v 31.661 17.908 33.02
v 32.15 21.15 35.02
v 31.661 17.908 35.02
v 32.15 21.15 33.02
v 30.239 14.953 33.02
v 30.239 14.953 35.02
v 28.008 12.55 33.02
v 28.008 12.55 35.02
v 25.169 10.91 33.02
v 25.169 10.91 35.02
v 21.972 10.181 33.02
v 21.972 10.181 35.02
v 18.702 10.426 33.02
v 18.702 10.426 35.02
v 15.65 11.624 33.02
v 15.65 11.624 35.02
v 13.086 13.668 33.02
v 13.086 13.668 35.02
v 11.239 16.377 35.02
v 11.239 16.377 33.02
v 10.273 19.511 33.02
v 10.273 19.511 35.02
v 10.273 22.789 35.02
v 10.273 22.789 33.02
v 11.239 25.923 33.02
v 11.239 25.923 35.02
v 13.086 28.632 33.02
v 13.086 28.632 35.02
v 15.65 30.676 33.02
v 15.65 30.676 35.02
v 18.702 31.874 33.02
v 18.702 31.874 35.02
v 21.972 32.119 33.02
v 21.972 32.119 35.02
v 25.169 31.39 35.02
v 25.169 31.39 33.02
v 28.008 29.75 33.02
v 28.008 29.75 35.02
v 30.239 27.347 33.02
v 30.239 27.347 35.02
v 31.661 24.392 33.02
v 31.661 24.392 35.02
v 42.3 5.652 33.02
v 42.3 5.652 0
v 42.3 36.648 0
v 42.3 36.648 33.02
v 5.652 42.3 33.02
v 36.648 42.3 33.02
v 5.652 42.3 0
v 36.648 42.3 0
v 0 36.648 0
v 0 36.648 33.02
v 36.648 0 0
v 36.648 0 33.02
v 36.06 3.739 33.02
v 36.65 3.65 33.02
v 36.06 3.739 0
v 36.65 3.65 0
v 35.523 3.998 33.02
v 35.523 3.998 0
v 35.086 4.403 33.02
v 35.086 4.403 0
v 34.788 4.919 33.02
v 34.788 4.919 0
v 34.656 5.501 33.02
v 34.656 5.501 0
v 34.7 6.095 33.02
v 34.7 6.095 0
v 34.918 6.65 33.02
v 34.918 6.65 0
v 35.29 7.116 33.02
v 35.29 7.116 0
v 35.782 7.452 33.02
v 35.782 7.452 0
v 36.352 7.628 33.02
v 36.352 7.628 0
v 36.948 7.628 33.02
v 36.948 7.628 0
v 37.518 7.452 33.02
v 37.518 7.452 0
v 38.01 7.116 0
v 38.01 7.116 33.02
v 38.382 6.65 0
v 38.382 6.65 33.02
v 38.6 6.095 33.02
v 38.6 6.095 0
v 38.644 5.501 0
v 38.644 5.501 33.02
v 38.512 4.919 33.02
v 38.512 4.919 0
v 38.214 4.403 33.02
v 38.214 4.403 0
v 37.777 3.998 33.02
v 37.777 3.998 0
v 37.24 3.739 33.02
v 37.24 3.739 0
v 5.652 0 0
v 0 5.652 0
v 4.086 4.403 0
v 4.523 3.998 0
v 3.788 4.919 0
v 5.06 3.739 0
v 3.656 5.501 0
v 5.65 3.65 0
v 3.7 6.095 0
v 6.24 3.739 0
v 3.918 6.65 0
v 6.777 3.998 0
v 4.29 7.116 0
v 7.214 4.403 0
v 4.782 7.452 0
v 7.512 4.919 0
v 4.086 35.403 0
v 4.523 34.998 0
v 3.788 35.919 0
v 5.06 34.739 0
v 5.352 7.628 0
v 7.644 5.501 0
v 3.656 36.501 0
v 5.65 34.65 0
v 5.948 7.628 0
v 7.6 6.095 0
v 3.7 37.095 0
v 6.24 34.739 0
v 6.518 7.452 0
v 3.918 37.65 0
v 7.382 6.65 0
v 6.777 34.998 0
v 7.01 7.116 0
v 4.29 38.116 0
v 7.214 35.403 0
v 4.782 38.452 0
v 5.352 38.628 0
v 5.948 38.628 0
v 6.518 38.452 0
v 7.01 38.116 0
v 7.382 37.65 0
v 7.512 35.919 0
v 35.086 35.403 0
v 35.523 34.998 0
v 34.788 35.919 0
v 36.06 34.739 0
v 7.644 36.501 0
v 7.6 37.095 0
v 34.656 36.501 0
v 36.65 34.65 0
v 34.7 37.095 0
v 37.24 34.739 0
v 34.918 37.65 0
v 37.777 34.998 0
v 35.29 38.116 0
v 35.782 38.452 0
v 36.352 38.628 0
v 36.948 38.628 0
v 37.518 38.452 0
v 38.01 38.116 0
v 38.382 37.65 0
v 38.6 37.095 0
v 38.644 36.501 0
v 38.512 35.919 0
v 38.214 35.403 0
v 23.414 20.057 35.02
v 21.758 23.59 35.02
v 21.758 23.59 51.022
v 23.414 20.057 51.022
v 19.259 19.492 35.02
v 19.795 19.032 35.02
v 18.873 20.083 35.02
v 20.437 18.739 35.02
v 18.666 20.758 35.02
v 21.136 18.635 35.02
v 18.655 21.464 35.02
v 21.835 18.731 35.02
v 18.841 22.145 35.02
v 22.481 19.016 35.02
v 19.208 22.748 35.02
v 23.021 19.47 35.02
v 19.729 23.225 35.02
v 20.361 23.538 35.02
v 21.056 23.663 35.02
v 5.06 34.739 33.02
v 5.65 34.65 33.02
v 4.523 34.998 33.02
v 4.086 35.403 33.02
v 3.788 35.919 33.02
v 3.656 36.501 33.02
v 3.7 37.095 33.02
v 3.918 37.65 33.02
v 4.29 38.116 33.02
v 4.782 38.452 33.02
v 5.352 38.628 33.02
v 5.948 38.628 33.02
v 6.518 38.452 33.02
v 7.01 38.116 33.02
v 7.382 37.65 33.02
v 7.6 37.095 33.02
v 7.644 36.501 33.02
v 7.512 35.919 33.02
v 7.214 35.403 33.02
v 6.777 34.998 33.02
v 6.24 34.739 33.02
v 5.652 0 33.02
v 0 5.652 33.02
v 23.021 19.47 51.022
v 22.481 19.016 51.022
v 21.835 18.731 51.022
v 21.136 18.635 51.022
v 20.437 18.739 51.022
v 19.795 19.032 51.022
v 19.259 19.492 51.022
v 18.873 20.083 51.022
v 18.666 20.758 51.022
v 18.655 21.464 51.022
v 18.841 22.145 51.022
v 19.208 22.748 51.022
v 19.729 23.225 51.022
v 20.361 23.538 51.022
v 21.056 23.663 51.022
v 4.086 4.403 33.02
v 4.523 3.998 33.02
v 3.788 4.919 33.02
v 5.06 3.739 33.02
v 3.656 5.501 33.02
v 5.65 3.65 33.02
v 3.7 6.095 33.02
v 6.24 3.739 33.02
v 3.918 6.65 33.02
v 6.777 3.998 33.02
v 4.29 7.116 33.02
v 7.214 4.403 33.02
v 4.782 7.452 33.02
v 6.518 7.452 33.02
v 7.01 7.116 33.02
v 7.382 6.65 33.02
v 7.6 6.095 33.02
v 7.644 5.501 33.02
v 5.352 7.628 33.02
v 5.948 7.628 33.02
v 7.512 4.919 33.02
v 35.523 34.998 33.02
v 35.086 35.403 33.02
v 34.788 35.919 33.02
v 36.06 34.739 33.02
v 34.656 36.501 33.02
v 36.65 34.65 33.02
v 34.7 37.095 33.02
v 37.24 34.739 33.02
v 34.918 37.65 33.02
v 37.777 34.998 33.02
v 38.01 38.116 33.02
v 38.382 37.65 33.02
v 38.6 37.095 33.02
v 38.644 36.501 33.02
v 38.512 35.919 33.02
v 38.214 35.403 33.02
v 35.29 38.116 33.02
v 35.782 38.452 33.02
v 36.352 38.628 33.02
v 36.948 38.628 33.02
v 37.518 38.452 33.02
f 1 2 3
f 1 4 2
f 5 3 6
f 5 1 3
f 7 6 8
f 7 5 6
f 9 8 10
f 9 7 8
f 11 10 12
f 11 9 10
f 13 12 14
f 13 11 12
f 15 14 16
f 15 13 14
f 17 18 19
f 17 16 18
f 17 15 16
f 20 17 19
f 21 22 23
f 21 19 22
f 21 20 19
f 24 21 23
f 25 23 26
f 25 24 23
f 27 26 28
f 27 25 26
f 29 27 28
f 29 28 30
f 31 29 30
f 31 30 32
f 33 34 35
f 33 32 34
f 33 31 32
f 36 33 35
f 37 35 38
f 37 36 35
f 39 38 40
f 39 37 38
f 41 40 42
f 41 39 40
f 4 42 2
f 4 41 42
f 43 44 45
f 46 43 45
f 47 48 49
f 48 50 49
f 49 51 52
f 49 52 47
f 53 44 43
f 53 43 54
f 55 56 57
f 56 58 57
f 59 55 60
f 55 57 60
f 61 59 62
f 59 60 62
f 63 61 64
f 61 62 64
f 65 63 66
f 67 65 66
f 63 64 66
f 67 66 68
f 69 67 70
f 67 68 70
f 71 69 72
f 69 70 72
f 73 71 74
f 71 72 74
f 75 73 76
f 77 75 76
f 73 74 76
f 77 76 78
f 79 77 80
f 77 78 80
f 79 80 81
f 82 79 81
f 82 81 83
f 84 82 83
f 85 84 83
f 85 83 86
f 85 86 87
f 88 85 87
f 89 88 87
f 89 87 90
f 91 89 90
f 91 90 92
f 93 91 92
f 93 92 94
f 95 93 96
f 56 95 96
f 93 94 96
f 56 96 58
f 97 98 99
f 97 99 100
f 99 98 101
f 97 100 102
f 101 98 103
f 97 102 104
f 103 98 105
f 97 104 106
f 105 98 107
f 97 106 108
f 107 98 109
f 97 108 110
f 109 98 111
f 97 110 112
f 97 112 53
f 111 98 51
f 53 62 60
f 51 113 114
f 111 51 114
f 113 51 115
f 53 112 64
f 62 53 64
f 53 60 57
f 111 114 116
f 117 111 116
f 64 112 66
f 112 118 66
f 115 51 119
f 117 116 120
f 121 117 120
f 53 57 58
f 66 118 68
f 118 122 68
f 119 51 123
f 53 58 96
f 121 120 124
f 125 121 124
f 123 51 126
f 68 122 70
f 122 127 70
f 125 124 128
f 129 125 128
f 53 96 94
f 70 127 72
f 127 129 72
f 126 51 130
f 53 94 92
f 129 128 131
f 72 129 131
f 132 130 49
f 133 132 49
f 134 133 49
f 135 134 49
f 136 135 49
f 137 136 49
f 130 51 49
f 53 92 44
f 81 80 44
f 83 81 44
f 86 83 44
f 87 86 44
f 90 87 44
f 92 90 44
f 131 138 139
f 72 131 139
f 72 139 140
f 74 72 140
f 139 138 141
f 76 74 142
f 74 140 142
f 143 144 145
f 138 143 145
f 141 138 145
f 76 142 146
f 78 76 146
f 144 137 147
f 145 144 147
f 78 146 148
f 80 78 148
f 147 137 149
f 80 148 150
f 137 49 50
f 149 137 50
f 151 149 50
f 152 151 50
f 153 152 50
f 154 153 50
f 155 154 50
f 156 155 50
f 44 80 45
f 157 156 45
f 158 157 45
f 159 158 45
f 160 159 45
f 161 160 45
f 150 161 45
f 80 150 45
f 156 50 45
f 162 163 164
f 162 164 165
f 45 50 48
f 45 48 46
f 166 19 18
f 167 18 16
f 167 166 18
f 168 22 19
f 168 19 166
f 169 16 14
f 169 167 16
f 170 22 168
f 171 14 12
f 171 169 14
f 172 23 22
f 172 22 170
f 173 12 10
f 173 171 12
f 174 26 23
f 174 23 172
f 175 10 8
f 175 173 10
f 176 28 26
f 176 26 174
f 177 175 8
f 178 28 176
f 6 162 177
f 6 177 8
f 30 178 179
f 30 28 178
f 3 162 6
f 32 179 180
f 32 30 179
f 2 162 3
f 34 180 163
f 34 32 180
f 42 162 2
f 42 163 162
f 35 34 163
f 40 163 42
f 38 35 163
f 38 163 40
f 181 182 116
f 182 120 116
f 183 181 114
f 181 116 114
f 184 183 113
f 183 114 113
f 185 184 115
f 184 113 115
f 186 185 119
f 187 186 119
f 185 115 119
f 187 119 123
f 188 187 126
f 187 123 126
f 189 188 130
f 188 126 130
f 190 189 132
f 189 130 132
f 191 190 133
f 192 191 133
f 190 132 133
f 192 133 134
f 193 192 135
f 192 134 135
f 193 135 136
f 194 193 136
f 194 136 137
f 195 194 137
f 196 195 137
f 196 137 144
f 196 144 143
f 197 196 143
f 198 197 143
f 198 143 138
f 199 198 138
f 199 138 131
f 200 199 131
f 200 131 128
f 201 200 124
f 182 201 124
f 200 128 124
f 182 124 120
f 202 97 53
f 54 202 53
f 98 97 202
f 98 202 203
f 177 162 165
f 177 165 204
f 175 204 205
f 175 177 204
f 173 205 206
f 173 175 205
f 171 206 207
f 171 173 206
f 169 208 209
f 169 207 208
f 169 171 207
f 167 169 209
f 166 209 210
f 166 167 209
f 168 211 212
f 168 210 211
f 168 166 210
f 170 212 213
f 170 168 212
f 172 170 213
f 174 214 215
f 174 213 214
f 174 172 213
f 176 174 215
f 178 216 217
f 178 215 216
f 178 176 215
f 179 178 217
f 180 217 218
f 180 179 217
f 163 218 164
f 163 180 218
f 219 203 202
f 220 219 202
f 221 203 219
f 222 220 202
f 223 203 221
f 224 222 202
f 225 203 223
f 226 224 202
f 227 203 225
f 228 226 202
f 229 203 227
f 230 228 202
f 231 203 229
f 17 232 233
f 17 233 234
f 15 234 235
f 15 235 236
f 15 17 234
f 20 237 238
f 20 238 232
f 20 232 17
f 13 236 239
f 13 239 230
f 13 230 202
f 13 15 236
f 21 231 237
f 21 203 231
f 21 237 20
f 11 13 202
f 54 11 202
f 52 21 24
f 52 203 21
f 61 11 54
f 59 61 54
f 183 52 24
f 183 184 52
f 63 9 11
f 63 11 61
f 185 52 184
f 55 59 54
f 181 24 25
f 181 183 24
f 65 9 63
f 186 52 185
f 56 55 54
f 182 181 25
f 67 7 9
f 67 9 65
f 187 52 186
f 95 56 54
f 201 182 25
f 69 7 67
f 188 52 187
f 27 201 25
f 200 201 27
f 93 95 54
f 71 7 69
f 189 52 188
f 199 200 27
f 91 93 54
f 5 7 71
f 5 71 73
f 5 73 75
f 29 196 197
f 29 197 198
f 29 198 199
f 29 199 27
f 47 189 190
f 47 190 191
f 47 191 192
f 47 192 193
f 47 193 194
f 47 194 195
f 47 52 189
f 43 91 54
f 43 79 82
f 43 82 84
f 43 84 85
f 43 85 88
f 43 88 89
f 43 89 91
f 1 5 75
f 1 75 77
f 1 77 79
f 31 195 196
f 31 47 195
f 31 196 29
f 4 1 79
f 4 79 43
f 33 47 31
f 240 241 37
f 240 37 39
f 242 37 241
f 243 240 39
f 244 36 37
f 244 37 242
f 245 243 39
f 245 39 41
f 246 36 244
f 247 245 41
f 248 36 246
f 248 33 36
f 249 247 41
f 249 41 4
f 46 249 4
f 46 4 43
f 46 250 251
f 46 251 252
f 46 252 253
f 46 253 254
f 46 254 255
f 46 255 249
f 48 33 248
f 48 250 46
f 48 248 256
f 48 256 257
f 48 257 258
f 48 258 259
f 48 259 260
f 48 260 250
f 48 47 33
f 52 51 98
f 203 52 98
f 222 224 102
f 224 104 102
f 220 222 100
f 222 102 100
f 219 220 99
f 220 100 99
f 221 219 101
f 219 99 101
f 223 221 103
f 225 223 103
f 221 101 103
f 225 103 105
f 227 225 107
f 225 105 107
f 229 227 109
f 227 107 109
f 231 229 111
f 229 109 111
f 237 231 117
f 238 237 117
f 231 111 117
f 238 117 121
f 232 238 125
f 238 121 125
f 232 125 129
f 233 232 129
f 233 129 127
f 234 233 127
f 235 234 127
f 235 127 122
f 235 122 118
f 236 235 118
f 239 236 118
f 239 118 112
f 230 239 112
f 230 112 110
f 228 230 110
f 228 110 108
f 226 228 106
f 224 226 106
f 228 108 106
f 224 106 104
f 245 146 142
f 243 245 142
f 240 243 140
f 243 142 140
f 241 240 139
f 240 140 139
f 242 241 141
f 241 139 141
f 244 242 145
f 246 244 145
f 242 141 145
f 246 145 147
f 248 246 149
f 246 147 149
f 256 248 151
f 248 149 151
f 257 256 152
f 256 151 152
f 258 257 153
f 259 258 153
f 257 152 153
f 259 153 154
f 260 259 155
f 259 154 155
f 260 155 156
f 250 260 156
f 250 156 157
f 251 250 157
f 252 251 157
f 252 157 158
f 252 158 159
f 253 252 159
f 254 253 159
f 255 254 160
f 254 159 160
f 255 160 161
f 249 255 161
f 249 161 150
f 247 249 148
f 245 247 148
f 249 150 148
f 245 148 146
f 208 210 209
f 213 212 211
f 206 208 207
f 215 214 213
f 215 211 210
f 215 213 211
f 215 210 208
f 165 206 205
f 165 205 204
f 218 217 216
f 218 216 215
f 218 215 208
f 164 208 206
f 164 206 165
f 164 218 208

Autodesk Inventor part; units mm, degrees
ref_plane "YZ Plane" through (0, 0, 0) normal (1, 0, 0) x (0, 1, 0)
ref_plane "XZ Plane" through (0, 0, 0) normal (0, 1, 0) x (-1, 0, 0)
ref_plane "XY Plane" through (0, 0, 0) normal (0, 0, 1) x (1, 0, 0)
sketch "Sketch1" plane through (0, 0, 0) normal (0, 0, 1) x (1, 0, 0)
  line L0 (5.6515, 0) -> (36.6485, 0)
  line L1 (42.3, 5.6515) -> (42.3, 36.6485)
  line L2 (36.6485, 42.3) -> (5.6515, 42.3)
  line L3 (0, 36.6485) -> (0, 5.6515)
  line L4 (0, 36.6485) -> (5.6515, 42.3)
  line L5 (36.6485, 42.3) -> (42.3, 36.6485)
  line L6 (42.3, 5.6515) -> (36.6485, 0)
  line L7 (5.6515, 0) -> (0, 5.6515)
  line L8 (21.15, 42.3) -> (21.15, 0) construction
  line L9 (0, 21.9578) -> (42.3, 21.9578) construction
  point P0 (0, 0)
  point P1 (42.3, 42.3)
  point P2 (42.3, 0)
  point P3 (0, 42.3)
  dimension "d0" = 42.3
  dimension "d1" = 42.3
  dimension "d2" = 5.6515
  dimension "d3" = 5.6515
  dimension "d4" = 5.6515
  dimension "d5" = 5.6515
  dimension "d6" = 5.6515
  dimension "d7" = 5.6515
  dimension "d8" = 5.6515
  dimension "d9" = 5.6515
  dimension "d10" = 30.997
extrude "Extrusion1" add sketch "Sketch1" along normal blind 33.02
sketch "Sketch2" plane through (0, 0, 33.02) normal (0, 0, 1) x (1, 0, 0)
  line L0 (5.6515, 42.3) -> (36.6485, 42.3) projected
  line L1 (0, 5.6515) -> (0, 36.6485) projected
  line L2 (36.6485, 0) -> (5.6515, 0) projected
  line L3 (42.3, 36.6485) -> (42.3, 5.6515) projected
  line L4 (21.15, 42.3) -> (21.15, 0) construction
  line L5 (0, 21.15) -> (42.3, 21.15) construction
  circle A0 centre (21.15, 21.15) radius 11
  point P0 (0, 0)
  dimension "d13" = 22
extrude "Extrusion2" add sketch "Sketch2" along normal blind 2
sketch "Sketch3" plane through (21.15, 21.15, 35.02) normal (0, 0, 1) x (1, 0, 0)
  circle A0 centre (0, 0) radius 11 projected
  arc A1 (0.6085, 2.4399) -> (2.2645, -1.0932) centre (0, 0) ccw
  line L0 (0.6085, 2.4399) -> (2.2645, -1.0932)
  line L1 (1.4365, 0.6733) -> (-2.2769, -1.0672) construction
  point P0 (-21.15, -21.15)
  dimension "d16" = 5.0292
  dimension "d34" = 3.9019
  dimension "d36" = 1.951
  dimension "d37" = 4.1011
extrude "Extrusion3" add sketch "Sketch3" along normal blind 16.002 contours L0 A1
sketch "Sketch4" plane through (0, 0, 33.02) normal (0, 0, 1) x (1, 0, 0)
  line L0 (0, 36.6485) -> (5.6515, 42.3) projected
  line L1 (5.6515, 0) -> (0, 5.6515) projected
  line L2 (42.3, 5.6515) -> (36.6485, 0) projected
  line L3 (36.6485, 42.3) -> (42.3, 36.6485) projected
  line L4 (2.8258, 39.4742) -> (39.4742, 2.8258) construction
  line L5 (39.4742, 39.4742) -> (2.8257, 2.8258) construction
  point P0 (0, 0)
  point P1 (5.65, 36.65)
  point P2 (36.65, 36.65)
  point P3 (5.65, 5.65)
  point P4 (36.65, 5.65)
  dimension "d20" = 31
  dimension "d21" = 31
  dimension "d22" = 31
  dimension "d23" = 31
hole "Hole1" at (5.65, 36.65, 33.02) at (36.65, 36.65, 33.02) at (5.65, 5.65, 33.02) at (36.65, 5.65, 33.02) direction (0, 0, -1) diameter 4 end through all
equation "\"d3\" = d2"
equation "\"d4\" = d2"
equation "\"d5\" = d4"
equation "\"d6\" = d2"
equation "\"d7\" = d6"
equation "\"d8\" = d2"
equation "\"d9\" = d8"
equation "\"d36\" = 0.5 * d34"
equation "\"d21\" = d20"
equation "\"d22\" = d20"
equation "\"d23\" = d20"
properties part number "stepper42BYGH007_RB01" material "Aluminum-6061"
